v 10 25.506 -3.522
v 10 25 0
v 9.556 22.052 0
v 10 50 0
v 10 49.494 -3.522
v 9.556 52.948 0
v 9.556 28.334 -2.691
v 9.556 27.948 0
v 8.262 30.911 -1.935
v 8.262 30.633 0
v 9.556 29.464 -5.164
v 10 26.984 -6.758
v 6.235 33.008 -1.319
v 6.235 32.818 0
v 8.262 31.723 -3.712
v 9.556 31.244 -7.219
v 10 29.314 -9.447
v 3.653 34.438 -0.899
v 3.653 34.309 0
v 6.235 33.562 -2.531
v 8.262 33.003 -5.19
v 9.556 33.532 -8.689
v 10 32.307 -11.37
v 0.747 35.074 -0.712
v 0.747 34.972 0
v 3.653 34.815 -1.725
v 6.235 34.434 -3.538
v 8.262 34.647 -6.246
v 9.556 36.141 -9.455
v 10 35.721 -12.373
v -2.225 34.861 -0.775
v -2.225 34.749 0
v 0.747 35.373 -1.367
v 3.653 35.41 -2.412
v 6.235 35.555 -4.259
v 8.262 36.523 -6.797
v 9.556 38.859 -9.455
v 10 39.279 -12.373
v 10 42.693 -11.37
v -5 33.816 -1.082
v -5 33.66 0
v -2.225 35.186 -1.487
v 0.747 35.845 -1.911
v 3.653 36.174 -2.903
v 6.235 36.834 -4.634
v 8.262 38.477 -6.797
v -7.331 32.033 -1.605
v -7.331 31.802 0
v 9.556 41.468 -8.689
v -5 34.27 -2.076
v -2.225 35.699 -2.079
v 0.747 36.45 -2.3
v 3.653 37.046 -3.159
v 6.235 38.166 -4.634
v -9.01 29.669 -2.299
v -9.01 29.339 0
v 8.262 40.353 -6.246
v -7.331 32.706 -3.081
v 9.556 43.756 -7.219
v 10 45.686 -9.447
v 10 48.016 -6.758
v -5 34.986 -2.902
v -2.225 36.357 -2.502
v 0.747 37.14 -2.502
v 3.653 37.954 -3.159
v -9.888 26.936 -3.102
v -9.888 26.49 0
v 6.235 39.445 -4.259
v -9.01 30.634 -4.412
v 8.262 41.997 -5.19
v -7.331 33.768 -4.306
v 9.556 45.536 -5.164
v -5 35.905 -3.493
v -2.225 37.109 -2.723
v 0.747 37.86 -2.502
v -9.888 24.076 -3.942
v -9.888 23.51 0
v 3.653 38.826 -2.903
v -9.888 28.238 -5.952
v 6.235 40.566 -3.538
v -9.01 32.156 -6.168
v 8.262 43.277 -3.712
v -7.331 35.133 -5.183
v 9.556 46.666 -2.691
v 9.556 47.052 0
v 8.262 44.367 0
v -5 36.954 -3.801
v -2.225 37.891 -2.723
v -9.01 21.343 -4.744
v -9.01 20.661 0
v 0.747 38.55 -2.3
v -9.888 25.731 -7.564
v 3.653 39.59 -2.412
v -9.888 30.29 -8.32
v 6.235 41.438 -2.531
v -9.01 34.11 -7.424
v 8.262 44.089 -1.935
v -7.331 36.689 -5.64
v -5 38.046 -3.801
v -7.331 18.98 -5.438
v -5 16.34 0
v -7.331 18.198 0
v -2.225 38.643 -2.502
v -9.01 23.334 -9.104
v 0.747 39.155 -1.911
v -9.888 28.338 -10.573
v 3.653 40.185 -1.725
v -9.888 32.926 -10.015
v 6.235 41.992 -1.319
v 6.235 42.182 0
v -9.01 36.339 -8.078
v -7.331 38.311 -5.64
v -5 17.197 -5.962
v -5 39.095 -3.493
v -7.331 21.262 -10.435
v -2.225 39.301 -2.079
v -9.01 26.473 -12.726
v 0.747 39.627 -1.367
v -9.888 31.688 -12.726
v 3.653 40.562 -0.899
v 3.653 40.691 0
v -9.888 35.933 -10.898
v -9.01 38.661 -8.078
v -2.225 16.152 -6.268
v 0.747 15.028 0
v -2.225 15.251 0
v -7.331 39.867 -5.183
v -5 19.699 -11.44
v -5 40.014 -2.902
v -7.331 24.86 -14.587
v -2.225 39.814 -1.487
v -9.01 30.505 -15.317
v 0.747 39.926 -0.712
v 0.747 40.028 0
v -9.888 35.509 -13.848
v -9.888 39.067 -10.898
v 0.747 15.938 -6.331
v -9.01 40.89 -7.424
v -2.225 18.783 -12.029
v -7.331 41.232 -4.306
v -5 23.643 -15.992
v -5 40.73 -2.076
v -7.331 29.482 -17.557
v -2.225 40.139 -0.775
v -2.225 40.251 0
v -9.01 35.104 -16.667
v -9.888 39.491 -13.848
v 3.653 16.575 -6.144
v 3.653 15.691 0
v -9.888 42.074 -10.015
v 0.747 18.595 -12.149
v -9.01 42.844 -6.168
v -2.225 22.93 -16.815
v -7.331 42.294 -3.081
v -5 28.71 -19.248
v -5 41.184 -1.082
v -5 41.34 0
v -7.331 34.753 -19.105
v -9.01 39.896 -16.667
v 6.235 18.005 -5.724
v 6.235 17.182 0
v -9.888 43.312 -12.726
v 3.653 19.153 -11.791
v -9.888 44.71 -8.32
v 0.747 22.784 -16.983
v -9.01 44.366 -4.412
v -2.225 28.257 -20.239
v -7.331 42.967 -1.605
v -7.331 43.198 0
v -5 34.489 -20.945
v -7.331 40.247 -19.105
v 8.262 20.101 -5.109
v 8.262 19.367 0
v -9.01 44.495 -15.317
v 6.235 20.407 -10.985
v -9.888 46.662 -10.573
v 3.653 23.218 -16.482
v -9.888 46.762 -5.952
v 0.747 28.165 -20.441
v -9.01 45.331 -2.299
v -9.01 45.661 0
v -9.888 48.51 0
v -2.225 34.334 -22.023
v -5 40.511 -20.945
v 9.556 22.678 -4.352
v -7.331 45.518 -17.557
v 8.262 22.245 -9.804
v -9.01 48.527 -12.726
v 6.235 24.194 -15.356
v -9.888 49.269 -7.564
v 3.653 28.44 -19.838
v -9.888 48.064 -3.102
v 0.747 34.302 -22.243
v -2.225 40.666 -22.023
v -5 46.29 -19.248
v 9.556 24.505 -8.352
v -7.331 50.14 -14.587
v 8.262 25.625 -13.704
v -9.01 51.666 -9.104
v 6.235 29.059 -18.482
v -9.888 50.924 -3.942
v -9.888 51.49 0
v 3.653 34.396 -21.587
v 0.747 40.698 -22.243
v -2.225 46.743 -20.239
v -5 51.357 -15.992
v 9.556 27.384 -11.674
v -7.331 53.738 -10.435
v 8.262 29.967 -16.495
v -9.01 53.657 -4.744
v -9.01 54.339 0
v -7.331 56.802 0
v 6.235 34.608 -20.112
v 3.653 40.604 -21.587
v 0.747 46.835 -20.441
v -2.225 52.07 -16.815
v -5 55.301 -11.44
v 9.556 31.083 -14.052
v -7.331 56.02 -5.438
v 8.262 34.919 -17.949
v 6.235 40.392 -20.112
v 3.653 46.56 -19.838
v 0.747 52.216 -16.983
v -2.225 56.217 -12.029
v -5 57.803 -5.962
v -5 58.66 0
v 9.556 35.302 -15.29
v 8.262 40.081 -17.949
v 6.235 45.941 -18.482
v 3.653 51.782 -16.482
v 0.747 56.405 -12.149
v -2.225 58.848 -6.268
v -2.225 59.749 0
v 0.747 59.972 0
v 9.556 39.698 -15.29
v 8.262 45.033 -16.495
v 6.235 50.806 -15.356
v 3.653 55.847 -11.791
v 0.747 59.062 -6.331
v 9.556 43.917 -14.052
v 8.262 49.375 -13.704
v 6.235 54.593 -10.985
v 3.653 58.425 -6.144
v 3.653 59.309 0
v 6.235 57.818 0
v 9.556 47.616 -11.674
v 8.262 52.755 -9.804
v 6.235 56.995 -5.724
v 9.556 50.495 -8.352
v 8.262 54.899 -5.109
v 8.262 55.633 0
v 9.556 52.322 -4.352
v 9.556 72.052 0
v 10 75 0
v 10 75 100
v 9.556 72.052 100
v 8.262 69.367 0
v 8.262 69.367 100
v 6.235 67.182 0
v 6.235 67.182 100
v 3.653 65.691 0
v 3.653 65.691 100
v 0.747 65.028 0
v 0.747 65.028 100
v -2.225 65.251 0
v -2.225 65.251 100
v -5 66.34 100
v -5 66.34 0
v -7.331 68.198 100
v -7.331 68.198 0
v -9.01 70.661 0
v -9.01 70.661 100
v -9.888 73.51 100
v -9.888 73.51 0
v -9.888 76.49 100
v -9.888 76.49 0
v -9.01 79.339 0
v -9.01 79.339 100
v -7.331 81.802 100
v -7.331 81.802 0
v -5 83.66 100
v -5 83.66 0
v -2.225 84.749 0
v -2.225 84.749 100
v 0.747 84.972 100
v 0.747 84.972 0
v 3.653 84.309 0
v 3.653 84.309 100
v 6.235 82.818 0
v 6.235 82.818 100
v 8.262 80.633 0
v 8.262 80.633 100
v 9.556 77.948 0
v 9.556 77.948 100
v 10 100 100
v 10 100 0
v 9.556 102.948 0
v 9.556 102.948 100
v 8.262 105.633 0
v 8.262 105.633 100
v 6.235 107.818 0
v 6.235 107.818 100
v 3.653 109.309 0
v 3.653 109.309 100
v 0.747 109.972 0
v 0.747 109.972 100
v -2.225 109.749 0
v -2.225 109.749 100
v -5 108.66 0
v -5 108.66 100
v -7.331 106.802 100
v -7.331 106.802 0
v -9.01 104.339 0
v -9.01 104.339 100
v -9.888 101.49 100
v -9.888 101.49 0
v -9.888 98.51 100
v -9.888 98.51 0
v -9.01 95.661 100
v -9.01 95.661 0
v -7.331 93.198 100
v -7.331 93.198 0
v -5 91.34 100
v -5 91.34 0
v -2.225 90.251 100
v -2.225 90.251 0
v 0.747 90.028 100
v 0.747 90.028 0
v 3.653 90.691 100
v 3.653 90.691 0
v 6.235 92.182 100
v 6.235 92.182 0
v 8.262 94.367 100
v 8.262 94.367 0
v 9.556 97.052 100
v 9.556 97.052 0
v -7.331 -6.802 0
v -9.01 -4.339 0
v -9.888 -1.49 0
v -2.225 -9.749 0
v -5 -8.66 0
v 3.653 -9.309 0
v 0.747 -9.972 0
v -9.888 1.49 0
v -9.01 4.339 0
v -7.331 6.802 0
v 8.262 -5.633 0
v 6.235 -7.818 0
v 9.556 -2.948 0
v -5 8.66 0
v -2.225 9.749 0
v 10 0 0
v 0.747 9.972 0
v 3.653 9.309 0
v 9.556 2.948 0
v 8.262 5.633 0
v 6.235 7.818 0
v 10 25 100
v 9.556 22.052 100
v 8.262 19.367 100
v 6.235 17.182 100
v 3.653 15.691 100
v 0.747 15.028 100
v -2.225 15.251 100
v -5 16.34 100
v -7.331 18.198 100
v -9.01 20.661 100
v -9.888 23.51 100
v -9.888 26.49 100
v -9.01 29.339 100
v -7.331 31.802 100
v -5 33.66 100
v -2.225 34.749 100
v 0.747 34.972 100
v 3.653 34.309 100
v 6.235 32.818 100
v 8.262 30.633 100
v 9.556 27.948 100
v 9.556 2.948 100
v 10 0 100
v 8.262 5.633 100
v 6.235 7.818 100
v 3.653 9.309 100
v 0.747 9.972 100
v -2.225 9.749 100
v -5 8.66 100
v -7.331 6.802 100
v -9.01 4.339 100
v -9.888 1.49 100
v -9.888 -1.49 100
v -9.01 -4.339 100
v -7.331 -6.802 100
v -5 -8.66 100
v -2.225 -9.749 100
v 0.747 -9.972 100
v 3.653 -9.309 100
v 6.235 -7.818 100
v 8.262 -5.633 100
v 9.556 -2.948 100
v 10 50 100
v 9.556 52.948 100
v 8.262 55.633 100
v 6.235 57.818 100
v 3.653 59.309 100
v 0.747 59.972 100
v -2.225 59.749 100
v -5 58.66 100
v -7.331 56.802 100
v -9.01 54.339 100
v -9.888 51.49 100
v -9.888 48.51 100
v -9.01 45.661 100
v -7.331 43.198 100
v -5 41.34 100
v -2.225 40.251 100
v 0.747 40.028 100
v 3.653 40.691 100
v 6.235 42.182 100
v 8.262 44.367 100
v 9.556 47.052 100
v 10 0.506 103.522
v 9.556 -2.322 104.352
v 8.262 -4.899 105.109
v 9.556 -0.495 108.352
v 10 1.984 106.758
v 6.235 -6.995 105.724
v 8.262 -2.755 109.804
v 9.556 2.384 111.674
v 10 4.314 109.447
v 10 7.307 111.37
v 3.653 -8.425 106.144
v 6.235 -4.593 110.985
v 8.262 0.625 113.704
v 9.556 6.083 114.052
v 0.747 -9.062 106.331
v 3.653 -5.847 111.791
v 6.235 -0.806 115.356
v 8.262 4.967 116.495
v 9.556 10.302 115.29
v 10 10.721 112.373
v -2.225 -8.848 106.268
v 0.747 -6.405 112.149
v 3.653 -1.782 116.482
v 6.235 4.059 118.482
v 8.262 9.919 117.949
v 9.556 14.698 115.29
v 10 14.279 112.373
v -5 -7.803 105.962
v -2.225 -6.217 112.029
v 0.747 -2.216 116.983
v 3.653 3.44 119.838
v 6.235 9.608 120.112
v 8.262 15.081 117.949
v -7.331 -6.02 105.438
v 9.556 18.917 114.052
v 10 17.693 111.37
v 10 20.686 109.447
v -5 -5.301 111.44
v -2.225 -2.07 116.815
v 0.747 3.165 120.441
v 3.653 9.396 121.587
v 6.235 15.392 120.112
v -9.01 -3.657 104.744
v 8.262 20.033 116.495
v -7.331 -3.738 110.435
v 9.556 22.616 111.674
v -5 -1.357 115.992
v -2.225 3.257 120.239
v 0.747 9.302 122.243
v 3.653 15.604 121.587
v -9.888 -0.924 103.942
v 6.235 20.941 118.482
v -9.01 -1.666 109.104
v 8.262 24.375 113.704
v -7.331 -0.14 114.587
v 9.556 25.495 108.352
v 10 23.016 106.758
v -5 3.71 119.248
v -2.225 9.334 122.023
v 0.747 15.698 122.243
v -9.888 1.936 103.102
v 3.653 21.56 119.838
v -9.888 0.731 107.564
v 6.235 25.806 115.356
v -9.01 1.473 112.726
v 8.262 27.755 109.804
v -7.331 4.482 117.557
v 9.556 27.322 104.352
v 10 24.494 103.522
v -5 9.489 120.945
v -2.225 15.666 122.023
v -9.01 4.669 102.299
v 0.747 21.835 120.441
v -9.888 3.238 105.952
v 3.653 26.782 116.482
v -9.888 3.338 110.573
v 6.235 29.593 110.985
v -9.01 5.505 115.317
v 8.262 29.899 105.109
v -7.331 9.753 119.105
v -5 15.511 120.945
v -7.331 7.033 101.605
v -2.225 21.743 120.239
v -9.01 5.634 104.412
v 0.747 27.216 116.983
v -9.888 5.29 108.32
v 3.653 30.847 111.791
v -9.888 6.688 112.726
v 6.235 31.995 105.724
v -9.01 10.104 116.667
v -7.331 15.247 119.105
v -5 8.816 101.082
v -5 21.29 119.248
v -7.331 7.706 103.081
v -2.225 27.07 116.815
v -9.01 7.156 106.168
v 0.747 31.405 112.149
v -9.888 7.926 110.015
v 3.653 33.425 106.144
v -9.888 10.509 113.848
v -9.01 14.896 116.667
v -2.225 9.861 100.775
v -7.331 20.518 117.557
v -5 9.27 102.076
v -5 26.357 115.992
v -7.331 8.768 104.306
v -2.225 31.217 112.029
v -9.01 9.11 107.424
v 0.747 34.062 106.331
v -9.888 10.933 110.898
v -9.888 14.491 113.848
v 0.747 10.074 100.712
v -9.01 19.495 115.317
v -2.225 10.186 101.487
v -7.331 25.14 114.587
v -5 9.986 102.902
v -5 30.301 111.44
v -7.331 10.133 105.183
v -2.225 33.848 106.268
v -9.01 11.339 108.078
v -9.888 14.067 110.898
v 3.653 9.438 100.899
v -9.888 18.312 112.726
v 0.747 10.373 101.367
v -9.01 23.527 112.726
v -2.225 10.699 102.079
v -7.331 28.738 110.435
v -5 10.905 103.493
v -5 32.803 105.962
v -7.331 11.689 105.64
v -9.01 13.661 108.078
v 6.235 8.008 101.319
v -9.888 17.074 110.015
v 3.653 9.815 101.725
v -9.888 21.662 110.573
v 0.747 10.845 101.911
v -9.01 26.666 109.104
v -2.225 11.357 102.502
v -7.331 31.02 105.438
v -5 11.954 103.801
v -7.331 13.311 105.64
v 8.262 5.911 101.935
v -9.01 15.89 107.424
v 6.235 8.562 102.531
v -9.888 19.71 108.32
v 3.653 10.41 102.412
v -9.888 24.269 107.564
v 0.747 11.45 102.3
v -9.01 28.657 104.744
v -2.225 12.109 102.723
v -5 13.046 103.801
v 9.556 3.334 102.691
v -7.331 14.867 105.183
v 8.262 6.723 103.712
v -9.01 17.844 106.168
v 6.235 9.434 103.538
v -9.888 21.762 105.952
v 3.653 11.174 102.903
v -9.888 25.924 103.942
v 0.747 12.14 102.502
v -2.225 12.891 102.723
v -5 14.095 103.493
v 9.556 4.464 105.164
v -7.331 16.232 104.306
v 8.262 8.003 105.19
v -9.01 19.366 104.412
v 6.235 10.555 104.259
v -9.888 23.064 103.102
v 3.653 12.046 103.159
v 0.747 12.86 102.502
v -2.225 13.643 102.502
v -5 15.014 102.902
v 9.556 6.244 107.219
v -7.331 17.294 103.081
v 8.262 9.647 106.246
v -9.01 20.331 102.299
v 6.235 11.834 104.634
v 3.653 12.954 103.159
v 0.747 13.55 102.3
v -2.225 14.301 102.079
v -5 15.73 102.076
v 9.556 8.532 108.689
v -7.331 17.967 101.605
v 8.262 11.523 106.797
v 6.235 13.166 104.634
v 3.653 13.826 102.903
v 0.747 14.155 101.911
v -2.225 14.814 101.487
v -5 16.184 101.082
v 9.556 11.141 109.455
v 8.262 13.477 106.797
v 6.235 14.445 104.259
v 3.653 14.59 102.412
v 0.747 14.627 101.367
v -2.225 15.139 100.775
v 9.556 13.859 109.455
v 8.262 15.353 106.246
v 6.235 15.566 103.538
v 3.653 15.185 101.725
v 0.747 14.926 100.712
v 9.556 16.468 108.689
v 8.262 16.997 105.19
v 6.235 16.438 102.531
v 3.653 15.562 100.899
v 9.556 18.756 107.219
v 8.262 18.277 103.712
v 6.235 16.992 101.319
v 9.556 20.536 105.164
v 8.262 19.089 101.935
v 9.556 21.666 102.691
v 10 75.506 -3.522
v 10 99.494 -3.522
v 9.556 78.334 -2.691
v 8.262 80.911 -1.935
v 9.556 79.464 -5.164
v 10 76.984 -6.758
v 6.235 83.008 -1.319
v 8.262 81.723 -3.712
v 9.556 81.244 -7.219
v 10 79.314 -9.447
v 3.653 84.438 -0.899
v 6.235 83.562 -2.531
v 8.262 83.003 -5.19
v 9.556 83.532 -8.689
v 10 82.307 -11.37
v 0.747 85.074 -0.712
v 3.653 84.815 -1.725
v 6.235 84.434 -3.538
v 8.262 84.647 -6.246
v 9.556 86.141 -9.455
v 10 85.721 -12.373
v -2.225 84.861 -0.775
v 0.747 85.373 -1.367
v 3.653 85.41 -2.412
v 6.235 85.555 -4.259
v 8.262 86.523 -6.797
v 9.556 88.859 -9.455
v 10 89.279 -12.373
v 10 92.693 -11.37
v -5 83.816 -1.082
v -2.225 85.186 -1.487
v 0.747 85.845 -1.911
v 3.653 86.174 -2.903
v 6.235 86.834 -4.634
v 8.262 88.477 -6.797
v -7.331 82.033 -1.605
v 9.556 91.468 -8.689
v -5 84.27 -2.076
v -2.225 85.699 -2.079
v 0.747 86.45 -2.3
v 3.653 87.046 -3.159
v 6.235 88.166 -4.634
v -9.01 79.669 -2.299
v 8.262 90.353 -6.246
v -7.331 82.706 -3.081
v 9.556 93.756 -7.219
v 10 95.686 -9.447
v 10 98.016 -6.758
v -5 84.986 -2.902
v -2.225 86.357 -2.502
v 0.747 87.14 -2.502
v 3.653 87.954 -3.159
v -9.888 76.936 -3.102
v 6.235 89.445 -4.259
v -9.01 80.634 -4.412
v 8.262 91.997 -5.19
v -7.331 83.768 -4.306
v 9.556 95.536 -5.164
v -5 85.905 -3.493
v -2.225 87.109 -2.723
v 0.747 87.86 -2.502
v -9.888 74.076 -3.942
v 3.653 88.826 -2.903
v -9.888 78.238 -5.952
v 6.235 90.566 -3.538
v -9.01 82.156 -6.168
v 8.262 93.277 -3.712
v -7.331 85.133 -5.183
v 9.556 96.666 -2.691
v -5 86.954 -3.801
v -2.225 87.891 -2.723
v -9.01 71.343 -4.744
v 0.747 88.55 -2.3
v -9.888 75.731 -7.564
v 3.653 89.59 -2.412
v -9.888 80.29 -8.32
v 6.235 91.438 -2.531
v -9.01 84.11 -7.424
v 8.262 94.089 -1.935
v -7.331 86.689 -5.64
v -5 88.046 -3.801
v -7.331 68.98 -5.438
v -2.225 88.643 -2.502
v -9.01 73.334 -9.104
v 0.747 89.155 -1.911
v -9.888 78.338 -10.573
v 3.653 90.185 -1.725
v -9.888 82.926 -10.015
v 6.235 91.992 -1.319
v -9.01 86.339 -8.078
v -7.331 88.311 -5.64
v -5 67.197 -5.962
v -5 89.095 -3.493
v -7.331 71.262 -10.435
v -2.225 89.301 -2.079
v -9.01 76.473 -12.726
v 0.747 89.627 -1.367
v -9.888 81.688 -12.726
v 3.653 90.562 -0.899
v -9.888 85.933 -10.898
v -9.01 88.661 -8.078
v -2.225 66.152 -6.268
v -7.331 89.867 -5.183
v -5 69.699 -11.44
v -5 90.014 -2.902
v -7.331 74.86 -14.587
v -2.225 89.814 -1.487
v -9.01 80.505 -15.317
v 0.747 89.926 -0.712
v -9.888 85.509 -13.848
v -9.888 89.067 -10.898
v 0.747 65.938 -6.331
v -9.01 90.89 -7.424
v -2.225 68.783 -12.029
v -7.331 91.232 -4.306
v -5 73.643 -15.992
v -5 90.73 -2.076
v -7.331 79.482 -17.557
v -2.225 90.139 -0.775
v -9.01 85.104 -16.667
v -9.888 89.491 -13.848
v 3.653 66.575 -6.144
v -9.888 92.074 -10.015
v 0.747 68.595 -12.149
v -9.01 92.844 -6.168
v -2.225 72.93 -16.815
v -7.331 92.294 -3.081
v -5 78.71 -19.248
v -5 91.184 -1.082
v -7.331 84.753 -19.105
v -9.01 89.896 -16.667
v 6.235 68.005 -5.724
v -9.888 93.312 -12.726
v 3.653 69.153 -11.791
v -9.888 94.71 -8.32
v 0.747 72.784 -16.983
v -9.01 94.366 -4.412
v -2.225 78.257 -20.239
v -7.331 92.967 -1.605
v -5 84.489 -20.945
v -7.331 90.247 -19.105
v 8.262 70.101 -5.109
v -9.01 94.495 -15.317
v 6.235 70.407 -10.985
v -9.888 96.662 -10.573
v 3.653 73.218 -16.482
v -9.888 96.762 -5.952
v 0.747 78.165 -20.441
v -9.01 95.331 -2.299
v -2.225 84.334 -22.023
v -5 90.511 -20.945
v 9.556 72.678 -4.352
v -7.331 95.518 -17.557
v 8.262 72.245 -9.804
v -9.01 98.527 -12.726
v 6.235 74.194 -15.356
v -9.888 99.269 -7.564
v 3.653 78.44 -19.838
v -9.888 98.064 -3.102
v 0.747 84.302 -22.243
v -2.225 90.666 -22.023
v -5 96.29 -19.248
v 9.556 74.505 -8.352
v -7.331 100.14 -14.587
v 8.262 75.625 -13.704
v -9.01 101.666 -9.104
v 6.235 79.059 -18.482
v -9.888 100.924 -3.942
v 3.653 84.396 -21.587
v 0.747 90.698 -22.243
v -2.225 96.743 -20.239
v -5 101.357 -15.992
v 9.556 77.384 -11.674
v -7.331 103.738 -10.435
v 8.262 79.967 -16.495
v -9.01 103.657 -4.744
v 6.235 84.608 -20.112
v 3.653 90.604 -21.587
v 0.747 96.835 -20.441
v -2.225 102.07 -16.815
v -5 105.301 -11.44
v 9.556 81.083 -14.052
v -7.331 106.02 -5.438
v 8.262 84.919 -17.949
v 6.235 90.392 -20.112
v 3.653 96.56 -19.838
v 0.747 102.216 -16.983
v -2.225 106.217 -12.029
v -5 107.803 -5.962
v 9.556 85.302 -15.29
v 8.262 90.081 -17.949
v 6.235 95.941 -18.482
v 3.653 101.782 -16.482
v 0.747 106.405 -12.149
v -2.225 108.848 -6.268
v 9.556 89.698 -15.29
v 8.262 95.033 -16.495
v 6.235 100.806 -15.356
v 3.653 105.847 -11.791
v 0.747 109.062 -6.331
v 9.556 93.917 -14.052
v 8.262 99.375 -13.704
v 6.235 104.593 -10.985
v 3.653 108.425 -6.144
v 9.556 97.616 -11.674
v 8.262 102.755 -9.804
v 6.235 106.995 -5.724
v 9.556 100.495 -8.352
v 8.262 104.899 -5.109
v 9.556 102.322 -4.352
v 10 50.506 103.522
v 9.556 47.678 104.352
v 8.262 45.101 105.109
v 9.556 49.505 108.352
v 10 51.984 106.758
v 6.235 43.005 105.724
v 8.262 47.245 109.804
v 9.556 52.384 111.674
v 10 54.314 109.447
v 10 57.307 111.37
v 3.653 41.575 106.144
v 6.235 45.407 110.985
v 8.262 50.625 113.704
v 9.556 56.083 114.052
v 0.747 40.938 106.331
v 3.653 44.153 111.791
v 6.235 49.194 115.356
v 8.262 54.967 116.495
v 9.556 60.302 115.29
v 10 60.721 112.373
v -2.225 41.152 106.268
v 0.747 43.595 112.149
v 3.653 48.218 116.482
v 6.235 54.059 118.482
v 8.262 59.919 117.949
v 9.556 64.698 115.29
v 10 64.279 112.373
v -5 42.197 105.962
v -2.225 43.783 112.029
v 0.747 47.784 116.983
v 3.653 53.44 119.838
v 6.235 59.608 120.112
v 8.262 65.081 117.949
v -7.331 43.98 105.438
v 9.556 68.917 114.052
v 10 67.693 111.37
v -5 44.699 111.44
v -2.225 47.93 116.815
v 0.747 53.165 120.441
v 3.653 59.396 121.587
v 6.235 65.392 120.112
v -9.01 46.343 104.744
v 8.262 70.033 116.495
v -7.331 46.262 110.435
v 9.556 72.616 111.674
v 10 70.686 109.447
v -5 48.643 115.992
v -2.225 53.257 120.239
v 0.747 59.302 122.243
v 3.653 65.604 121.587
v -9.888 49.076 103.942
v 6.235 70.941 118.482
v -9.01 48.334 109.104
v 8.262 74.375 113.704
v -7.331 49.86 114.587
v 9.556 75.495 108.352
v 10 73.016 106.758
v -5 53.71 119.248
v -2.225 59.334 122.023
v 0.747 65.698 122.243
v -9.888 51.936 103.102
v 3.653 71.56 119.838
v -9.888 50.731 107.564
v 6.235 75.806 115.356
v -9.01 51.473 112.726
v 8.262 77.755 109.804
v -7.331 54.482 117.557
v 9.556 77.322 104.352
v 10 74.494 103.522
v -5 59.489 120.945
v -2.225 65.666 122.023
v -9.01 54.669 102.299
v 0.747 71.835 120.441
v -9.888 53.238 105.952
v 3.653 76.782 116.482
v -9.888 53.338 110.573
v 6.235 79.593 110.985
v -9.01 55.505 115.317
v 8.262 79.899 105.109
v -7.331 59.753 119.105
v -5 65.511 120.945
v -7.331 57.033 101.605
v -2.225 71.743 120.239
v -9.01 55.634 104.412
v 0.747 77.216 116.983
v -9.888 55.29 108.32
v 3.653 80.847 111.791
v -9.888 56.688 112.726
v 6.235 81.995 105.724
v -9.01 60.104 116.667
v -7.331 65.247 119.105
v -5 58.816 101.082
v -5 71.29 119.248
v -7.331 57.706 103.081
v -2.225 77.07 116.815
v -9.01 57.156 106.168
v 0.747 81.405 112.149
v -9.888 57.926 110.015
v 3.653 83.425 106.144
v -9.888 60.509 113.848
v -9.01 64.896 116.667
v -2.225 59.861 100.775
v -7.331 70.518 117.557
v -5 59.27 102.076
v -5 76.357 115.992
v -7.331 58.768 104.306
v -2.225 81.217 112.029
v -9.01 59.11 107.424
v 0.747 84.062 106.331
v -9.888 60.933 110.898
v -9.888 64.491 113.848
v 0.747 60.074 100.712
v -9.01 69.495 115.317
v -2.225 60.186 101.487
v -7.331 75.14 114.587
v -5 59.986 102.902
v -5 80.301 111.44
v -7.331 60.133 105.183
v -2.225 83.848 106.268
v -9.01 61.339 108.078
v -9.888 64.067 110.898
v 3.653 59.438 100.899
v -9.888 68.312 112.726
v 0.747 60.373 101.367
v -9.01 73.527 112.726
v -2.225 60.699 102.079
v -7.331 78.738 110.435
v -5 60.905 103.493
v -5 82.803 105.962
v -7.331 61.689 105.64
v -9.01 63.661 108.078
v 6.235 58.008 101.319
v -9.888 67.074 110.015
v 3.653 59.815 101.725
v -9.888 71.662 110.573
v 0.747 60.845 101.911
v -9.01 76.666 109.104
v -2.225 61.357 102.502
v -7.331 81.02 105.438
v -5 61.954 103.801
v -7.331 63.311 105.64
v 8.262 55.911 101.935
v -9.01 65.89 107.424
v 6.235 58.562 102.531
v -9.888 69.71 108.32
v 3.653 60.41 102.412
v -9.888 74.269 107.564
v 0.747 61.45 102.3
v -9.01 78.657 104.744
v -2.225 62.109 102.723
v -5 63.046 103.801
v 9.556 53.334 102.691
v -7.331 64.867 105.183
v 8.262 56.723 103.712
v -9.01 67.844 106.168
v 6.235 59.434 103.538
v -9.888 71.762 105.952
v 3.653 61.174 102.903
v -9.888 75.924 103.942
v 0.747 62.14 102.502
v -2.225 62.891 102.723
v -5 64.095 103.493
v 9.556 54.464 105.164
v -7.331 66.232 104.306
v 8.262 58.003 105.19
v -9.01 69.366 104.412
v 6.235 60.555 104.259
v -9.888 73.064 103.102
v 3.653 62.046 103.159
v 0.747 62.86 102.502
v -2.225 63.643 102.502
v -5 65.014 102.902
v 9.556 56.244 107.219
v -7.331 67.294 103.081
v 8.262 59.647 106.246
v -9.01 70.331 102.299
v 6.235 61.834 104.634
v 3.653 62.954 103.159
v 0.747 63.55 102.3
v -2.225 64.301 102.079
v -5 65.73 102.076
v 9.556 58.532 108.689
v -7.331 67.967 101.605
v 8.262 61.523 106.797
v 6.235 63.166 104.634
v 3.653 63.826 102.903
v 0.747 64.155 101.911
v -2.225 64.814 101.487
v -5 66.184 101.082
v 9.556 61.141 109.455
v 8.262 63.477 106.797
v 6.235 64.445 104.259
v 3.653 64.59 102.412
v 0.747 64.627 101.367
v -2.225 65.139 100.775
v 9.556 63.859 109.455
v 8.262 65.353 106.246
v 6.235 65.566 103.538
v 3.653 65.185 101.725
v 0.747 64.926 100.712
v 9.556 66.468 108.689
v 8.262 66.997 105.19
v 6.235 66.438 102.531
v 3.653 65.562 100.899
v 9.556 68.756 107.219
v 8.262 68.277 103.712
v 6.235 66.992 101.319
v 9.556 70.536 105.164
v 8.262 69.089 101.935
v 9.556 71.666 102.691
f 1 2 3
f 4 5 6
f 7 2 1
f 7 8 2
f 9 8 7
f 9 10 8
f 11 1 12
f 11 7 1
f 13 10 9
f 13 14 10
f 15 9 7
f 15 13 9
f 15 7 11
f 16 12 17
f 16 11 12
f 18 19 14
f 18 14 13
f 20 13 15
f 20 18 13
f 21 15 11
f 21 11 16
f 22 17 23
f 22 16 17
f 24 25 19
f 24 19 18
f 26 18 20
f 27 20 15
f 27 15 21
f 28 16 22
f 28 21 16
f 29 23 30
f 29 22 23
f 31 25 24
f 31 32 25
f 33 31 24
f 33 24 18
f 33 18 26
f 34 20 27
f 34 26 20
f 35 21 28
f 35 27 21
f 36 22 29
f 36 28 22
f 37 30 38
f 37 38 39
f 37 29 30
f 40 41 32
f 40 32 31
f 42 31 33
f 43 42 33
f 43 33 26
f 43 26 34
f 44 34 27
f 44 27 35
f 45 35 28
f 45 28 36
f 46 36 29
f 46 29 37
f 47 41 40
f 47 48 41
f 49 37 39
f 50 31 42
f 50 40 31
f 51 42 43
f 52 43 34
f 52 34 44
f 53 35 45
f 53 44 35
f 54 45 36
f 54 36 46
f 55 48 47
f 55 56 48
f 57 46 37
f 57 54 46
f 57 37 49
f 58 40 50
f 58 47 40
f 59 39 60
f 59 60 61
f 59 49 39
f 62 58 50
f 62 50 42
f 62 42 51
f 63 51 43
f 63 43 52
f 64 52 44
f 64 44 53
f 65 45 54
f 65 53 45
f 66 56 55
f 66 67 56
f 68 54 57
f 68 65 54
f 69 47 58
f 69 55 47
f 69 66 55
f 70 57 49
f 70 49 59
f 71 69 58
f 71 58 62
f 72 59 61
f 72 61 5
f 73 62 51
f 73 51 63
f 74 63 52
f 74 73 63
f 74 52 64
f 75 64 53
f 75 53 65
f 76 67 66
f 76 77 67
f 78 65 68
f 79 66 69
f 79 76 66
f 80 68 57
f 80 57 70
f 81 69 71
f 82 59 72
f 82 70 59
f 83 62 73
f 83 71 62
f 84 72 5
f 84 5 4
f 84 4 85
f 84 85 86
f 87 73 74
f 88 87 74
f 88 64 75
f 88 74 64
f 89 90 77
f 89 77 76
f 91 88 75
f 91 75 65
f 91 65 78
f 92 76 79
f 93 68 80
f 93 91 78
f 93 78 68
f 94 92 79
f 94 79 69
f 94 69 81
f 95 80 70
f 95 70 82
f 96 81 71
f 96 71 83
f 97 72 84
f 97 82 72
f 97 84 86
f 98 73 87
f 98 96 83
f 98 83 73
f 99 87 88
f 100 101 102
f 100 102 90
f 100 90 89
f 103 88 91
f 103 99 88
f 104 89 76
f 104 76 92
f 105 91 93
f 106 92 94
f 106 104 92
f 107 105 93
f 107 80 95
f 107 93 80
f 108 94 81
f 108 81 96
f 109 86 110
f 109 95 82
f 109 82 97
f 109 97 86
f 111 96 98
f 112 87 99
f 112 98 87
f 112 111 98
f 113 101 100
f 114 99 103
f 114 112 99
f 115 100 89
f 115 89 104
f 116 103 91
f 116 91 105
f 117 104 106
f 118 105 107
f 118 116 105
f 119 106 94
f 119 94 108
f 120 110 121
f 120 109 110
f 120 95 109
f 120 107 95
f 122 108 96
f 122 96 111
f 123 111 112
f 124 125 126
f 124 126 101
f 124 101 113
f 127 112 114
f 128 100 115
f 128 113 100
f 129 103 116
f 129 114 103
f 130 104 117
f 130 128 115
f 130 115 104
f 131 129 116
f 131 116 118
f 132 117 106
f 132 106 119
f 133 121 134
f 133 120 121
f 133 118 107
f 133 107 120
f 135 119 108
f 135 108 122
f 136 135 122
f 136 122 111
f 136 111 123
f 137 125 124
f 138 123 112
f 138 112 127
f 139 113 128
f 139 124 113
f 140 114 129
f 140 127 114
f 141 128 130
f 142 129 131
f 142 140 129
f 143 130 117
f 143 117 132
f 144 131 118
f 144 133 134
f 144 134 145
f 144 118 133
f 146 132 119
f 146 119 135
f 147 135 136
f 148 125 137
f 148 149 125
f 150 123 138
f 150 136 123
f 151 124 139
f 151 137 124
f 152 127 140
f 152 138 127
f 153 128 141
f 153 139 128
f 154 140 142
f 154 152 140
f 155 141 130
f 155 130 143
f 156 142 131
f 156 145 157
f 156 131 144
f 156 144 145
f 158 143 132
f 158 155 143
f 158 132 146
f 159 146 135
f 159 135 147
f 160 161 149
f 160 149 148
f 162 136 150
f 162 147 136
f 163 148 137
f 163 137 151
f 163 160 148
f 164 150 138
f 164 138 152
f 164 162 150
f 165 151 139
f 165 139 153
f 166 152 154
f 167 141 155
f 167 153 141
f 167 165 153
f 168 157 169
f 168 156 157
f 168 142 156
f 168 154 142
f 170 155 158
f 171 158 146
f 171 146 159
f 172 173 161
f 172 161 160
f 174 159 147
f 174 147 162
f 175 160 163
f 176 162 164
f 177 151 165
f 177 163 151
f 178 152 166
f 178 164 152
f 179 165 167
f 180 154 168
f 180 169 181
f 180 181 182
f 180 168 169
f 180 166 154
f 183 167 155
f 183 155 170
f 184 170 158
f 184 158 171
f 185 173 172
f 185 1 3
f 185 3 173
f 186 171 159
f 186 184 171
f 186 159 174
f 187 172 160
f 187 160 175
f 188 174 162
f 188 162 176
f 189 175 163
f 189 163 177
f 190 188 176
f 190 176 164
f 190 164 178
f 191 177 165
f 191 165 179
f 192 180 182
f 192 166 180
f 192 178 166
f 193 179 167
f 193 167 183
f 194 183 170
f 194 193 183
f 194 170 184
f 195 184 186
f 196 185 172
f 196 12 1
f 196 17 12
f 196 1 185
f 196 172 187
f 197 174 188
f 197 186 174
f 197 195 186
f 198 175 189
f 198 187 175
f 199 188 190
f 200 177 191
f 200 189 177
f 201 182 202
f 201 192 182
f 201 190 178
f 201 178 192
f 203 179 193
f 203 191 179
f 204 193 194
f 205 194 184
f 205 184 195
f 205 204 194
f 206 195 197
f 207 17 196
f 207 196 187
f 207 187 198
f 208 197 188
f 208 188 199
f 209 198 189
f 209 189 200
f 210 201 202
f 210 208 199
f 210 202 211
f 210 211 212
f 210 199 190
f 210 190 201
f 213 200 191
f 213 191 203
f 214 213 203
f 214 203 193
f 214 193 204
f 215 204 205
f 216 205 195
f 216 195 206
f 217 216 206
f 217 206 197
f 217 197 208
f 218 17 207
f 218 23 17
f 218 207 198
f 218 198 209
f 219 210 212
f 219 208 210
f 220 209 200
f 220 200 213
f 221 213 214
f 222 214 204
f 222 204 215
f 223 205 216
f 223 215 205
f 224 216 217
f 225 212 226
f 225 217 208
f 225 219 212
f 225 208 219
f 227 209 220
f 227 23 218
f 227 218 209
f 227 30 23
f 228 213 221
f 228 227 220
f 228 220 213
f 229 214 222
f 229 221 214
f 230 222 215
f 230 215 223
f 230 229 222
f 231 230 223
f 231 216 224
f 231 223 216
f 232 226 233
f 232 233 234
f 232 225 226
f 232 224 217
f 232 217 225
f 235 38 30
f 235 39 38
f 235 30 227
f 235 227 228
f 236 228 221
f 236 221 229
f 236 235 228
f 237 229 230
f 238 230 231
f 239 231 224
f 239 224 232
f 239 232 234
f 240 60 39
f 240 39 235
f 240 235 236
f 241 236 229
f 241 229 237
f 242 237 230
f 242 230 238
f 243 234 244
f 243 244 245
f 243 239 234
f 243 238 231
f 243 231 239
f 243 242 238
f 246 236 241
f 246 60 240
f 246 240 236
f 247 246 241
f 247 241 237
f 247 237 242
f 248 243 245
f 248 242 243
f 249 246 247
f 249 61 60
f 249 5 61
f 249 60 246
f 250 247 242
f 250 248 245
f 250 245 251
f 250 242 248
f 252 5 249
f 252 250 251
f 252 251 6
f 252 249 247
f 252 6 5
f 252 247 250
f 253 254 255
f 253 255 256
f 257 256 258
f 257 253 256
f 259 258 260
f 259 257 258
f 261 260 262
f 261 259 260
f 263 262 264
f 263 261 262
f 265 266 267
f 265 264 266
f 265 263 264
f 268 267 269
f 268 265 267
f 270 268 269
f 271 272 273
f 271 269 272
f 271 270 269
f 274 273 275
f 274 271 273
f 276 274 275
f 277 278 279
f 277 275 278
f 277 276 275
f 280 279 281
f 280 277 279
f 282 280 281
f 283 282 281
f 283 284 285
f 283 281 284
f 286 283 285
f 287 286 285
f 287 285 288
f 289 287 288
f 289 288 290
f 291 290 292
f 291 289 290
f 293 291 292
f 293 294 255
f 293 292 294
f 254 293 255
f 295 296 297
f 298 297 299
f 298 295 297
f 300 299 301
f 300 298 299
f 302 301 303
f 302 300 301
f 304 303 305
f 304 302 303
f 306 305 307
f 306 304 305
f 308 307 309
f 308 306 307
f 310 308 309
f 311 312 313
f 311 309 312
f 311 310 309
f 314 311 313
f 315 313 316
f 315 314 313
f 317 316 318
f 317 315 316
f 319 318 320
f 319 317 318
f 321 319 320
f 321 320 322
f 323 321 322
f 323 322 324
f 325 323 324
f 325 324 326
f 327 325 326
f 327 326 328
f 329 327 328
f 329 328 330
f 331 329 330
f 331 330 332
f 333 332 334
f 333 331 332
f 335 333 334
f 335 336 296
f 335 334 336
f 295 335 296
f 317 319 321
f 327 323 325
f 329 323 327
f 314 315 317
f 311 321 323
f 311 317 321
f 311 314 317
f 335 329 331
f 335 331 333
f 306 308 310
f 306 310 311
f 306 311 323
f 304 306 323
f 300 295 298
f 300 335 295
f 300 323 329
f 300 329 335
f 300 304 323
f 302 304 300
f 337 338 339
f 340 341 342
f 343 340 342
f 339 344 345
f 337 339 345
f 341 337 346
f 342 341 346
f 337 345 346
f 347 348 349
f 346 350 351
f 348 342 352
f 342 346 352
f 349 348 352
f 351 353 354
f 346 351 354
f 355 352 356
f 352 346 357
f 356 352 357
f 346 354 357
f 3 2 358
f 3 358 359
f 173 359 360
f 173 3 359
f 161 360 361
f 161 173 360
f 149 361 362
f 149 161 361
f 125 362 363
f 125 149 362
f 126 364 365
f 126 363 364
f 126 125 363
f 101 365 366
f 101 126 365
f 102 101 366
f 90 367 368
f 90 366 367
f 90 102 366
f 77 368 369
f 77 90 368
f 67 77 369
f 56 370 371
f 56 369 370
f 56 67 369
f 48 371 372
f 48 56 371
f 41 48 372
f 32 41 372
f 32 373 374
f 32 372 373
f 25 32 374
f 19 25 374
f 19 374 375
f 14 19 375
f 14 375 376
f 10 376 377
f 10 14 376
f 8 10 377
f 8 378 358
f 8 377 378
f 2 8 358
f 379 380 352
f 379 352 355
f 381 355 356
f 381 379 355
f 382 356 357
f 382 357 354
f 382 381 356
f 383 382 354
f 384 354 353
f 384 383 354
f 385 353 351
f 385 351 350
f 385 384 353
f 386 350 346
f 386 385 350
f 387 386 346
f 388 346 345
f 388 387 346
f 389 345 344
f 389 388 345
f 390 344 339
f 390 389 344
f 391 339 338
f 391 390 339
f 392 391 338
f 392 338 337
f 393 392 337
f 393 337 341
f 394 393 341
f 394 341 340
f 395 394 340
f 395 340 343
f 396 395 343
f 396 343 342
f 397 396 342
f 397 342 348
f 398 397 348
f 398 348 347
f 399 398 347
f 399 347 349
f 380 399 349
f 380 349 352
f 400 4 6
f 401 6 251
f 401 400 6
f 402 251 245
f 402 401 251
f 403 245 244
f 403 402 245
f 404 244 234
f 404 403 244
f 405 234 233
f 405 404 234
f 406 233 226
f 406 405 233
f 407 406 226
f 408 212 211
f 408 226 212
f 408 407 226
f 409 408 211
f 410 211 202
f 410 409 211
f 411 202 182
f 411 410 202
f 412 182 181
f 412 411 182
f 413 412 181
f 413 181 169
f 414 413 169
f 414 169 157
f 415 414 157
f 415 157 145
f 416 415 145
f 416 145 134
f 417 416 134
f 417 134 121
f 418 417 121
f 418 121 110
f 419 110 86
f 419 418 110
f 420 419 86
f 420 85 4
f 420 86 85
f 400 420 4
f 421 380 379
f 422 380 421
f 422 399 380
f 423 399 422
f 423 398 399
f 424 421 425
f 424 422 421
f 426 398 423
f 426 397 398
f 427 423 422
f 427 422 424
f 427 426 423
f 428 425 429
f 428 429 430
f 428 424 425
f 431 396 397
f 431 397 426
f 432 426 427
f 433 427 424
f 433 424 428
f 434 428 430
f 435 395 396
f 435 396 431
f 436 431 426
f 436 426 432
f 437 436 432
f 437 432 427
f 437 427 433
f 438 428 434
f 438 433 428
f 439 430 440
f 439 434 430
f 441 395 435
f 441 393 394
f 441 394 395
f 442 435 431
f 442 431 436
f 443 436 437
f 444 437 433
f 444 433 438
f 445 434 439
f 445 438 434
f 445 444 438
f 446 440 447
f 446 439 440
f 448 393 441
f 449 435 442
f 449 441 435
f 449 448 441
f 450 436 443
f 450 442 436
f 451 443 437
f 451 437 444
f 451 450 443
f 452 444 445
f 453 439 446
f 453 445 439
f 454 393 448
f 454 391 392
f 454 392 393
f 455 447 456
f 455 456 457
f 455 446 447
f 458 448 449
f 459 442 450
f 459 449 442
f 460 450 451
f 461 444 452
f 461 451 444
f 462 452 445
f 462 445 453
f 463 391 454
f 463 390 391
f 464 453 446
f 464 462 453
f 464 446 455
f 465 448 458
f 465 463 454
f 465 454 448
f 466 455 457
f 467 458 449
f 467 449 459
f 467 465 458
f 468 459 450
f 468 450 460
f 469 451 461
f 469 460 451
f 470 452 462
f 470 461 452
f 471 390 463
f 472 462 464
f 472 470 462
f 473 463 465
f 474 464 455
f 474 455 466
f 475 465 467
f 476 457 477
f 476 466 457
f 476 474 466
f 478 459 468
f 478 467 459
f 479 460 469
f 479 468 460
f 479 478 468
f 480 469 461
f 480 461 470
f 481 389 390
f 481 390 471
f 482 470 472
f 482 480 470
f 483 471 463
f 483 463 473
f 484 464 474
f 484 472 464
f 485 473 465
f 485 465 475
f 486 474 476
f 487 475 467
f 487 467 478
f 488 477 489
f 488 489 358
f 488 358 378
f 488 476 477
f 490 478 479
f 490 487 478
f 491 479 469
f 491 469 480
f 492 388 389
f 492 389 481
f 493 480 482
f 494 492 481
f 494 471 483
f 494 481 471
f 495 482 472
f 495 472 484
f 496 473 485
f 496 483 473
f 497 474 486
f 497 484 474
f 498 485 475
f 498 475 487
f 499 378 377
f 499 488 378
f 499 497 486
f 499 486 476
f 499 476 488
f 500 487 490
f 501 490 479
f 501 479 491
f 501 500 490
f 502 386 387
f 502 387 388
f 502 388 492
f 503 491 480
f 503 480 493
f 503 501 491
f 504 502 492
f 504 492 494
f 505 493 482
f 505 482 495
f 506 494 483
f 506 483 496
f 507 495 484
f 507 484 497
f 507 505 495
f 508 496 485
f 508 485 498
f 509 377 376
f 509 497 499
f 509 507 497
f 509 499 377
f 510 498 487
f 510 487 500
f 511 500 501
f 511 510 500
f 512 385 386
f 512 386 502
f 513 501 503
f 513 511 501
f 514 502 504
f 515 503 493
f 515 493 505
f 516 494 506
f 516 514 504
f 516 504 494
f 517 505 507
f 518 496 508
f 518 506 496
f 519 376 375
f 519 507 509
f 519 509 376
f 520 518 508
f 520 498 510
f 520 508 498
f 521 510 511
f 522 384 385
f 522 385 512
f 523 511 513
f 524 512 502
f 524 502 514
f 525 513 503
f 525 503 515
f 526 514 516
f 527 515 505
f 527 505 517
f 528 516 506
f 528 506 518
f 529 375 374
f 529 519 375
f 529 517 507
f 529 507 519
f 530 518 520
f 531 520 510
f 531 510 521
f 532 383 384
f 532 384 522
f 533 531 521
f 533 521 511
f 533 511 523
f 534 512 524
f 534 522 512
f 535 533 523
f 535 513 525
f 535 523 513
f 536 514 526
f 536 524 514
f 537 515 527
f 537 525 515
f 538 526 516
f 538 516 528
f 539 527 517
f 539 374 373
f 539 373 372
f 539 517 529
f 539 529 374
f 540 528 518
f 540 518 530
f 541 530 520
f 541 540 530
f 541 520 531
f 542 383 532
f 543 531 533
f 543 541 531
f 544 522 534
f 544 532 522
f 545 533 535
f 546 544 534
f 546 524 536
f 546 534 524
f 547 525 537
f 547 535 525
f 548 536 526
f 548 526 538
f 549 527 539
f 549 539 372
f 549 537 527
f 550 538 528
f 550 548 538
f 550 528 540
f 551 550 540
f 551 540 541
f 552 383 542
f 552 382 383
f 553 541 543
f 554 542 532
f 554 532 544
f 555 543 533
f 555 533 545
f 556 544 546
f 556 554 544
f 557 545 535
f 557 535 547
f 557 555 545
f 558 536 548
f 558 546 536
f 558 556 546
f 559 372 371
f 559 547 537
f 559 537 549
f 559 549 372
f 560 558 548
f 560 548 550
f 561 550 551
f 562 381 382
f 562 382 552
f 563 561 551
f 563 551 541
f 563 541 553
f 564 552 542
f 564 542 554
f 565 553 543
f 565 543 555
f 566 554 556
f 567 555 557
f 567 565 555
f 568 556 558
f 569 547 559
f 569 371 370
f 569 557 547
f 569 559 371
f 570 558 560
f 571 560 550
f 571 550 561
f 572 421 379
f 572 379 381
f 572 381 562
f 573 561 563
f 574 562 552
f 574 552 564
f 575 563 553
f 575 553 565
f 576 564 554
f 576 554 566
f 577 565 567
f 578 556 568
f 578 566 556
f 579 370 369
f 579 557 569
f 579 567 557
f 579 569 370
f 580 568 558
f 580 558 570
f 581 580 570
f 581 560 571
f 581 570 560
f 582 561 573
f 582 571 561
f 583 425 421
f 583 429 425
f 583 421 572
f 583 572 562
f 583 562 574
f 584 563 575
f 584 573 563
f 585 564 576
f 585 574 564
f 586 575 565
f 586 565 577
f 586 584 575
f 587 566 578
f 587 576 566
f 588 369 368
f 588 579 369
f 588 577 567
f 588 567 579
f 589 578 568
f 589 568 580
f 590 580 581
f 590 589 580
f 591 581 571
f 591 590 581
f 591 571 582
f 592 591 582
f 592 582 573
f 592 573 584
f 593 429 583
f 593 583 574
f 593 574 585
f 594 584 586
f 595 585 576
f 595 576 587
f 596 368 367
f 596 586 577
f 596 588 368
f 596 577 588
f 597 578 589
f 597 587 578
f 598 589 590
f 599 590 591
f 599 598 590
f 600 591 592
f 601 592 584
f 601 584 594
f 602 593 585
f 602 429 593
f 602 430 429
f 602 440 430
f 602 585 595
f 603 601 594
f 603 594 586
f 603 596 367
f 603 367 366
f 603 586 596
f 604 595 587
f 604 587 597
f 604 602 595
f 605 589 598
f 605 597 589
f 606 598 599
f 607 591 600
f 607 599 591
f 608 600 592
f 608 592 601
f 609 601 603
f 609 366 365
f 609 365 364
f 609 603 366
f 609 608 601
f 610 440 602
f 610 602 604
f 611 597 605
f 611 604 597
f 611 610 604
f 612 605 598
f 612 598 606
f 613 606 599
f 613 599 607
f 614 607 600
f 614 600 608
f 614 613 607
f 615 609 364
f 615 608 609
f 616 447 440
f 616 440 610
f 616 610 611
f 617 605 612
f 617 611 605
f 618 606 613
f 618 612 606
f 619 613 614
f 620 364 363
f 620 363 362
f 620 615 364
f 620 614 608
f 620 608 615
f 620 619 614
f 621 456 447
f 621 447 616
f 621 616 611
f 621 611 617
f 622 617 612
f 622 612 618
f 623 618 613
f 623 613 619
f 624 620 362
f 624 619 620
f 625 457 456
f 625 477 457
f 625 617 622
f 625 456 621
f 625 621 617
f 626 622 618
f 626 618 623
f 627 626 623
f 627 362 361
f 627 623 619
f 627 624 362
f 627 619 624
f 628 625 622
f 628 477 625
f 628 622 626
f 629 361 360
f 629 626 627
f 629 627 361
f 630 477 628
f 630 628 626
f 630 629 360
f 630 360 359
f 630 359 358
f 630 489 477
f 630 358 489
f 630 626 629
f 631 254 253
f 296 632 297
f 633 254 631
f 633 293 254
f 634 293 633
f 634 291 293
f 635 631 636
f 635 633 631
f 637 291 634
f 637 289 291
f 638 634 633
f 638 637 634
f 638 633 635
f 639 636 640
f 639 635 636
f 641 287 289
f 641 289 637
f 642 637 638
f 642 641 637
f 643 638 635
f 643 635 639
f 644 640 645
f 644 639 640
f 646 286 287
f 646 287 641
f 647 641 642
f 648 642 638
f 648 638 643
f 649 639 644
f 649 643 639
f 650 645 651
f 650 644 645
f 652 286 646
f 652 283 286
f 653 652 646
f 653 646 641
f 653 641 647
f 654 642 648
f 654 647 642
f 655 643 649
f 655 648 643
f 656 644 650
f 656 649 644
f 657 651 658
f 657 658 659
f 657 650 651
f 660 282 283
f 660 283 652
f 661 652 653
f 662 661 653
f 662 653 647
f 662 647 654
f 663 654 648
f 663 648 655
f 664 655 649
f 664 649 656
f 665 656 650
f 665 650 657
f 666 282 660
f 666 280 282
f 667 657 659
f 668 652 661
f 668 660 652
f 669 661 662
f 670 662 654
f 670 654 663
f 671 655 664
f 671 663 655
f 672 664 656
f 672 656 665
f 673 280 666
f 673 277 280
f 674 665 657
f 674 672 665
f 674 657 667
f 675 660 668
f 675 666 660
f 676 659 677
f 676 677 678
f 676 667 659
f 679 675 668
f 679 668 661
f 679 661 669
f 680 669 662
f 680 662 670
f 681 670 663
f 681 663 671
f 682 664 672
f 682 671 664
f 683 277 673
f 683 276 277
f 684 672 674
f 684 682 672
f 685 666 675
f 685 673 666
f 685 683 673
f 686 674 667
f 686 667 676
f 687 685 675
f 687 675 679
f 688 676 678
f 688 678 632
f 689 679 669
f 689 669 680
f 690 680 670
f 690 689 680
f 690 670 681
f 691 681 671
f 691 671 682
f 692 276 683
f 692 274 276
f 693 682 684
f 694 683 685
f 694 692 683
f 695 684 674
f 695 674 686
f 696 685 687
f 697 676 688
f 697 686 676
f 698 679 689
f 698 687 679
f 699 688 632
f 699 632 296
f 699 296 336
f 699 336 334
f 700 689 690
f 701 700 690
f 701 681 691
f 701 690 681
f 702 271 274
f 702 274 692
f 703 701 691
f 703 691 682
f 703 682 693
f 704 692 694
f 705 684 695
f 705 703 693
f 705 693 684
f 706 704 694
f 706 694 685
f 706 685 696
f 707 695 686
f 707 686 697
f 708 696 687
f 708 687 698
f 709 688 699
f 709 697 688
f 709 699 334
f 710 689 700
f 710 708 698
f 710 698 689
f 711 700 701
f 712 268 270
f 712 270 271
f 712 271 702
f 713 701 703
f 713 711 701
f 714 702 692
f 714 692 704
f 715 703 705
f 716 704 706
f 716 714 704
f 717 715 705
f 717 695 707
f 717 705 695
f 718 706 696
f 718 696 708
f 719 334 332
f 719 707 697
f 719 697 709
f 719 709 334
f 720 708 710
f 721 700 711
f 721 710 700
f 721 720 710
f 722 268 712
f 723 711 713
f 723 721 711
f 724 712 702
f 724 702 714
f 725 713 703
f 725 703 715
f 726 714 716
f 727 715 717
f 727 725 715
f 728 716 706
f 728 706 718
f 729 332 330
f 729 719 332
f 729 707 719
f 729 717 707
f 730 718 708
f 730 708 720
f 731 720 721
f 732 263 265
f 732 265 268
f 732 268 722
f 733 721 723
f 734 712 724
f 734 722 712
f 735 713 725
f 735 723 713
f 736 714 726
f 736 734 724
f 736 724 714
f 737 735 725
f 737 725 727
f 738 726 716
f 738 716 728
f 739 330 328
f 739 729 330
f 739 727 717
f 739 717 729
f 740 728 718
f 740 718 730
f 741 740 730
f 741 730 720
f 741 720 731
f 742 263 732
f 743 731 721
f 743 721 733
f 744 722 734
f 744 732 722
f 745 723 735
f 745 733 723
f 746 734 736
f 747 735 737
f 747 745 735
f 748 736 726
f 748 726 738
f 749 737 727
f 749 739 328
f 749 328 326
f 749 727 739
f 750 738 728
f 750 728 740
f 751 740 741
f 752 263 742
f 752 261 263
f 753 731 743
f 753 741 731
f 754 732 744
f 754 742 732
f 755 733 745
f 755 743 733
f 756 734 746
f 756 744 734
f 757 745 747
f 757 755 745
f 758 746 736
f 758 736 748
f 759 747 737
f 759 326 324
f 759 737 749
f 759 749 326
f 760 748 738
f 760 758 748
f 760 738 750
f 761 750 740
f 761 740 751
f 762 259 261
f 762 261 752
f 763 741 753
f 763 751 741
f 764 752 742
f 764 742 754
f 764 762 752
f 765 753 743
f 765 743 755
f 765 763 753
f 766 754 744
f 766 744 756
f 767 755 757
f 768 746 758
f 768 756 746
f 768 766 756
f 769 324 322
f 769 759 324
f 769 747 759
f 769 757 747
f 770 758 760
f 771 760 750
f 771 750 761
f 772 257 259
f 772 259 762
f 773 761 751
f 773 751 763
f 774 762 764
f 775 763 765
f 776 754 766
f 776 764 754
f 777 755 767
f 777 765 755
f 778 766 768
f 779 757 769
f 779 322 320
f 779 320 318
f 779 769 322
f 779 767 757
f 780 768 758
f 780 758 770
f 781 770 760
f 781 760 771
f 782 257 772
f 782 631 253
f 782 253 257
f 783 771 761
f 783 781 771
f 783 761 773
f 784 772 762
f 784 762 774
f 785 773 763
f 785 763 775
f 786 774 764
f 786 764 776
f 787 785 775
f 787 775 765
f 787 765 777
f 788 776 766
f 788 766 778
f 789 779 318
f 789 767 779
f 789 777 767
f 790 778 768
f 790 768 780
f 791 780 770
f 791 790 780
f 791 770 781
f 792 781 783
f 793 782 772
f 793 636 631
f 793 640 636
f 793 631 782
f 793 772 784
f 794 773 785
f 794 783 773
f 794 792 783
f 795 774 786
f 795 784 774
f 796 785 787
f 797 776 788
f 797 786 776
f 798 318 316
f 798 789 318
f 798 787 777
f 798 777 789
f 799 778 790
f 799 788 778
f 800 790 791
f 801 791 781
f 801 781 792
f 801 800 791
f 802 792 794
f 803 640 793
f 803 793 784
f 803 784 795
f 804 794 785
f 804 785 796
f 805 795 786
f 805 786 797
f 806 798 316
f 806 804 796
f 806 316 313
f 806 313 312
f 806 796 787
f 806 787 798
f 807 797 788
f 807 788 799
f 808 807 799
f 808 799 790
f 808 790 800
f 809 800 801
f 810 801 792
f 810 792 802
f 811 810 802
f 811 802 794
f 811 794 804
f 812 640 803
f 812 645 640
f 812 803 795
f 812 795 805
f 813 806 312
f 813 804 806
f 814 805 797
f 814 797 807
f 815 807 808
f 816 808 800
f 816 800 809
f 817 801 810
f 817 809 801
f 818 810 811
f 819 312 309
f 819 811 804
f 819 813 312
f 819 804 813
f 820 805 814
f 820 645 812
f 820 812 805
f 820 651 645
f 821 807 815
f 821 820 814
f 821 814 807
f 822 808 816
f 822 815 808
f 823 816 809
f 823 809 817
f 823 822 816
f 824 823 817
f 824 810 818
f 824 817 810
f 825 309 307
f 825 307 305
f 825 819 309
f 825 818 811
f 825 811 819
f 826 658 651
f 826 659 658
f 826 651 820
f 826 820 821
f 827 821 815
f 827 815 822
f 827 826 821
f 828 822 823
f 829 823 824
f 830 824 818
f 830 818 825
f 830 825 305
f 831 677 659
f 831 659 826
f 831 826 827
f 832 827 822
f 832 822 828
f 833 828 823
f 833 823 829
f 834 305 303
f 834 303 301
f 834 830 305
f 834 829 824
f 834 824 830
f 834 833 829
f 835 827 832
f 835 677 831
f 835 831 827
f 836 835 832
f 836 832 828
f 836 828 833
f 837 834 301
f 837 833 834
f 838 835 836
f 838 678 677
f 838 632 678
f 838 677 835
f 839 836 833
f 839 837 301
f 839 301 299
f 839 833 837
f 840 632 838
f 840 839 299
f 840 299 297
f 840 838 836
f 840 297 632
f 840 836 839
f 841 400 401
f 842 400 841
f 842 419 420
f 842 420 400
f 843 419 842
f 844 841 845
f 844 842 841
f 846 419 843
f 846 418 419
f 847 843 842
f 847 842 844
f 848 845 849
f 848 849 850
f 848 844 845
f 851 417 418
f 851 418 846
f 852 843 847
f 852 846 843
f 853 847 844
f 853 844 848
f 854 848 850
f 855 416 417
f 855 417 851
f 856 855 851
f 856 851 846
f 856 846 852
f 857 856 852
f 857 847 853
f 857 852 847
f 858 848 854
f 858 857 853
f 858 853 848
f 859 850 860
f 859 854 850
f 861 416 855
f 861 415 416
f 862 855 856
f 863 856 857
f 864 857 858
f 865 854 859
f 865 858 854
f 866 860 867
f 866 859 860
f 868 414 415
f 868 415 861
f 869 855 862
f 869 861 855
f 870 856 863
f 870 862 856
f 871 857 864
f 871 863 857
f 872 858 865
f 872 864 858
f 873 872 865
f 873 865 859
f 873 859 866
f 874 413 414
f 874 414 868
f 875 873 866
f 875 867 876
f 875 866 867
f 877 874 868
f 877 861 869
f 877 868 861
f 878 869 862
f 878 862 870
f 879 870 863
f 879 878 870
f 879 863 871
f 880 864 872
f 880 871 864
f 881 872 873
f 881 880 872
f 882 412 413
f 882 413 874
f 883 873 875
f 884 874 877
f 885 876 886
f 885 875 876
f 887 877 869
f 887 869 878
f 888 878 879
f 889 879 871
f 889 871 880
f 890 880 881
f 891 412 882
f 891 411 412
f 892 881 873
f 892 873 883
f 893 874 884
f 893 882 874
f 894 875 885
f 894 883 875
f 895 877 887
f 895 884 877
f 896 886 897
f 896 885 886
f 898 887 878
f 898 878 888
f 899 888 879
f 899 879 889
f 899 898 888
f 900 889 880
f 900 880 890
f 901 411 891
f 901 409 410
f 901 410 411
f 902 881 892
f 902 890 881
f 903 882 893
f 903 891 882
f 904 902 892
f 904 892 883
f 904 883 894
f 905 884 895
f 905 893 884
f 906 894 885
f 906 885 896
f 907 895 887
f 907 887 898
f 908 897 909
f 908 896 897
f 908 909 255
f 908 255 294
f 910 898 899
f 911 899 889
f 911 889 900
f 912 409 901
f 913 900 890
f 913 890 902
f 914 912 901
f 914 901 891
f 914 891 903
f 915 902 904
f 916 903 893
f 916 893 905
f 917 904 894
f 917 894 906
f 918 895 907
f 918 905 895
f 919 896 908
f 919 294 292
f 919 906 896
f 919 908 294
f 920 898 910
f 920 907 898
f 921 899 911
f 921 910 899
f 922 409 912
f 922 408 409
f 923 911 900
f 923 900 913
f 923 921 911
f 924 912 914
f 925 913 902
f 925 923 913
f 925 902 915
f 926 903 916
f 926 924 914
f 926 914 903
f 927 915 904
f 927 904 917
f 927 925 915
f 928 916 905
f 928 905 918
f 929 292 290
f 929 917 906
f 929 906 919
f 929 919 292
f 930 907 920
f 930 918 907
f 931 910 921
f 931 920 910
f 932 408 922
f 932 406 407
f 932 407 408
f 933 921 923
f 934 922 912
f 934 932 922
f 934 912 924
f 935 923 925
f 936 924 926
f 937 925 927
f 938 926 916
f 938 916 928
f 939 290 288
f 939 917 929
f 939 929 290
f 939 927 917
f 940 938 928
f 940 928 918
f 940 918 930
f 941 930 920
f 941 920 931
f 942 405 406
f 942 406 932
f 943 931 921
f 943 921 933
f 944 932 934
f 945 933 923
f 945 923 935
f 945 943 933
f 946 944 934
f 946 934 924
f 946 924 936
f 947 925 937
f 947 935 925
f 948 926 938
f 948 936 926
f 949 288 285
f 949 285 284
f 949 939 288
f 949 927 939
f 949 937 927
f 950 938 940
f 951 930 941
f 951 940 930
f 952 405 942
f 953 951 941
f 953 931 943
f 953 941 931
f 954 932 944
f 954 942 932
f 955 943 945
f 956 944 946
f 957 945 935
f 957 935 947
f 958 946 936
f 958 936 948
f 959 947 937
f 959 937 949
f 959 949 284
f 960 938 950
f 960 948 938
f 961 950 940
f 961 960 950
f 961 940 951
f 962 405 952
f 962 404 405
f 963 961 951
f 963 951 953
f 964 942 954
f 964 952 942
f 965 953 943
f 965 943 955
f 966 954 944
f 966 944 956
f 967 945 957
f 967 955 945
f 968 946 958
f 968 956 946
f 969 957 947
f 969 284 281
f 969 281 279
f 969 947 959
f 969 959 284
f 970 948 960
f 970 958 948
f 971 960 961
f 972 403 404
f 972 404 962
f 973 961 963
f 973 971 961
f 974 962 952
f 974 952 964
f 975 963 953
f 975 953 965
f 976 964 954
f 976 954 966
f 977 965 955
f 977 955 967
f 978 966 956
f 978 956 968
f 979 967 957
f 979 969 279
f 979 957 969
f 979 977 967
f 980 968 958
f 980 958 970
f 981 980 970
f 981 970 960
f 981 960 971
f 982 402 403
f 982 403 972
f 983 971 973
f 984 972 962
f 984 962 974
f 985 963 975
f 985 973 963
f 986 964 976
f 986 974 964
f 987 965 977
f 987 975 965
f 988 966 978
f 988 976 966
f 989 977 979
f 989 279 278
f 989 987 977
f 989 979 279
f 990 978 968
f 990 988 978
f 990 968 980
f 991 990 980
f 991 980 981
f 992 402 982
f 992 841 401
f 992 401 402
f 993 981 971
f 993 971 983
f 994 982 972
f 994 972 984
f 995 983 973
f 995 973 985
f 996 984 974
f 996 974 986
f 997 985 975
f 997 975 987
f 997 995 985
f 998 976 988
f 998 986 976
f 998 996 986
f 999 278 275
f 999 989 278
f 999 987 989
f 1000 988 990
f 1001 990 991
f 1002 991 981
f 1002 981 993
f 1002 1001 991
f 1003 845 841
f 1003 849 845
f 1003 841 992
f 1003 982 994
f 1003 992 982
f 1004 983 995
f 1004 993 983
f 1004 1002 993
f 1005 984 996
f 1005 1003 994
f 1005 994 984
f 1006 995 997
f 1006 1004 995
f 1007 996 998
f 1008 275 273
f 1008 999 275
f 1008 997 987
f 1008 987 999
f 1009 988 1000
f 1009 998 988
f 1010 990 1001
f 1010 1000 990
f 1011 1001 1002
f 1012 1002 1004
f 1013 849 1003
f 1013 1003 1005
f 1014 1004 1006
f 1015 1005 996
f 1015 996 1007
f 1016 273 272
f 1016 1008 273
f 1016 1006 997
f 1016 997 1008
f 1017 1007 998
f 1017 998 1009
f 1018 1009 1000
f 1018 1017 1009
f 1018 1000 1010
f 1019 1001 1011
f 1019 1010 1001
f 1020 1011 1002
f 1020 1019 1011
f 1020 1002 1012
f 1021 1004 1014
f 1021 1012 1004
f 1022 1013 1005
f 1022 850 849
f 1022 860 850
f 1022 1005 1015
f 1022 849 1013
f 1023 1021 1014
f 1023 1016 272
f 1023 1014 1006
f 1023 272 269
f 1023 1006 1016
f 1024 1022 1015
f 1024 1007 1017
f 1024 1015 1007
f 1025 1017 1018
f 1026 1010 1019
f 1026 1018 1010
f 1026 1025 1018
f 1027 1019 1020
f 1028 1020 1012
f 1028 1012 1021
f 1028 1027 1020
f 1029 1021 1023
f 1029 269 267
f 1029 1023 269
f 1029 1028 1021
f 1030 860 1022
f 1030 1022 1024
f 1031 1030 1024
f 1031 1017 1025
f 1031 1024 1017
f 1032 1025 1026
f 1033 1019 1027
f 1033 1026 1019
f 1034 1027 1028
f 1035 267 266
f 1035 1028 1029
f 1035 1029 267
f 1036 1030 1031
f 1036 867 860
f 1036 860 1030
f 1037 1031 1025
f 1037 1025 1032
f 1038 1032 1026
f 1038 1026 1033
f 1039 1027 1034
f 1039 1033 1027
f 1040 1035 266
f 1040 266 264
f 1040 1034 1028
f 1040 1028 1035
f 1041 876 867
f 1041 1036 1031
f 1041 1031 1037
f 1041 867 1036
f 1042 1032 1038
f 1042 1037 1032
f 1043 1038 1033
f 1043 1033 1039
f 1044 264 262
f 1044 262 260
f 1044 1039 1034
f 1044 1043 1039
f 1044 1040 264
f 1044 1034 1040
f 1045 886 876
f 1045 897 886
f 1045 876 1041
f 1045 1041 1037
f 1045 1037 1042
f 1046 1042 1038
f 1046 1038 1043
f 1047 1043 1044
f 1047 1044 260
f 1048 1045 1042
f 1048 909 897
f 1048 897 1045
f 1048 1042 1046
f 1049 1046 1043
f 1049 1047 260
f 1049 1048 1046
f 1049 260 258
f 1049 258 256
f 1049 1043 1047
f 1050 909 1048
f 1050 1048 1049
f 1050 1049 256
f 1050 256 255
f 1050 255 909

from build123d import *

# Parameters (mm, degrees)
F0_R = 10


with BuildPart() as f2:
    # F2: sweep along a path in F1
    with BuildLine(Plane.YZ) as f2_path:
        Line((0, 0), (0, 100))
        ThreePointArc((0, 100), (12.5, 112.5), (25, 100))
        Line((25, 100), (25, 0))
        ThreePointArc((25, 0), (37.5, -12.5), (50, 0))
        Line((50, 0), (50, 100))
        ThreePointArc((50, 100), (62.5, 112.5), (75, 100))
        Line((75, 100), (75, 0))
        ThreePointArc((75, 0), (87.5, -12.5), (100, 0))
        Line((100, 0), (100, 100))
    # F0 (on Top) → F2 (sweep)
    with BuildSketch(Plane.XY):
        Circle(F0_R)
    sweep(path=f2_path.line)


solid = f2.part
